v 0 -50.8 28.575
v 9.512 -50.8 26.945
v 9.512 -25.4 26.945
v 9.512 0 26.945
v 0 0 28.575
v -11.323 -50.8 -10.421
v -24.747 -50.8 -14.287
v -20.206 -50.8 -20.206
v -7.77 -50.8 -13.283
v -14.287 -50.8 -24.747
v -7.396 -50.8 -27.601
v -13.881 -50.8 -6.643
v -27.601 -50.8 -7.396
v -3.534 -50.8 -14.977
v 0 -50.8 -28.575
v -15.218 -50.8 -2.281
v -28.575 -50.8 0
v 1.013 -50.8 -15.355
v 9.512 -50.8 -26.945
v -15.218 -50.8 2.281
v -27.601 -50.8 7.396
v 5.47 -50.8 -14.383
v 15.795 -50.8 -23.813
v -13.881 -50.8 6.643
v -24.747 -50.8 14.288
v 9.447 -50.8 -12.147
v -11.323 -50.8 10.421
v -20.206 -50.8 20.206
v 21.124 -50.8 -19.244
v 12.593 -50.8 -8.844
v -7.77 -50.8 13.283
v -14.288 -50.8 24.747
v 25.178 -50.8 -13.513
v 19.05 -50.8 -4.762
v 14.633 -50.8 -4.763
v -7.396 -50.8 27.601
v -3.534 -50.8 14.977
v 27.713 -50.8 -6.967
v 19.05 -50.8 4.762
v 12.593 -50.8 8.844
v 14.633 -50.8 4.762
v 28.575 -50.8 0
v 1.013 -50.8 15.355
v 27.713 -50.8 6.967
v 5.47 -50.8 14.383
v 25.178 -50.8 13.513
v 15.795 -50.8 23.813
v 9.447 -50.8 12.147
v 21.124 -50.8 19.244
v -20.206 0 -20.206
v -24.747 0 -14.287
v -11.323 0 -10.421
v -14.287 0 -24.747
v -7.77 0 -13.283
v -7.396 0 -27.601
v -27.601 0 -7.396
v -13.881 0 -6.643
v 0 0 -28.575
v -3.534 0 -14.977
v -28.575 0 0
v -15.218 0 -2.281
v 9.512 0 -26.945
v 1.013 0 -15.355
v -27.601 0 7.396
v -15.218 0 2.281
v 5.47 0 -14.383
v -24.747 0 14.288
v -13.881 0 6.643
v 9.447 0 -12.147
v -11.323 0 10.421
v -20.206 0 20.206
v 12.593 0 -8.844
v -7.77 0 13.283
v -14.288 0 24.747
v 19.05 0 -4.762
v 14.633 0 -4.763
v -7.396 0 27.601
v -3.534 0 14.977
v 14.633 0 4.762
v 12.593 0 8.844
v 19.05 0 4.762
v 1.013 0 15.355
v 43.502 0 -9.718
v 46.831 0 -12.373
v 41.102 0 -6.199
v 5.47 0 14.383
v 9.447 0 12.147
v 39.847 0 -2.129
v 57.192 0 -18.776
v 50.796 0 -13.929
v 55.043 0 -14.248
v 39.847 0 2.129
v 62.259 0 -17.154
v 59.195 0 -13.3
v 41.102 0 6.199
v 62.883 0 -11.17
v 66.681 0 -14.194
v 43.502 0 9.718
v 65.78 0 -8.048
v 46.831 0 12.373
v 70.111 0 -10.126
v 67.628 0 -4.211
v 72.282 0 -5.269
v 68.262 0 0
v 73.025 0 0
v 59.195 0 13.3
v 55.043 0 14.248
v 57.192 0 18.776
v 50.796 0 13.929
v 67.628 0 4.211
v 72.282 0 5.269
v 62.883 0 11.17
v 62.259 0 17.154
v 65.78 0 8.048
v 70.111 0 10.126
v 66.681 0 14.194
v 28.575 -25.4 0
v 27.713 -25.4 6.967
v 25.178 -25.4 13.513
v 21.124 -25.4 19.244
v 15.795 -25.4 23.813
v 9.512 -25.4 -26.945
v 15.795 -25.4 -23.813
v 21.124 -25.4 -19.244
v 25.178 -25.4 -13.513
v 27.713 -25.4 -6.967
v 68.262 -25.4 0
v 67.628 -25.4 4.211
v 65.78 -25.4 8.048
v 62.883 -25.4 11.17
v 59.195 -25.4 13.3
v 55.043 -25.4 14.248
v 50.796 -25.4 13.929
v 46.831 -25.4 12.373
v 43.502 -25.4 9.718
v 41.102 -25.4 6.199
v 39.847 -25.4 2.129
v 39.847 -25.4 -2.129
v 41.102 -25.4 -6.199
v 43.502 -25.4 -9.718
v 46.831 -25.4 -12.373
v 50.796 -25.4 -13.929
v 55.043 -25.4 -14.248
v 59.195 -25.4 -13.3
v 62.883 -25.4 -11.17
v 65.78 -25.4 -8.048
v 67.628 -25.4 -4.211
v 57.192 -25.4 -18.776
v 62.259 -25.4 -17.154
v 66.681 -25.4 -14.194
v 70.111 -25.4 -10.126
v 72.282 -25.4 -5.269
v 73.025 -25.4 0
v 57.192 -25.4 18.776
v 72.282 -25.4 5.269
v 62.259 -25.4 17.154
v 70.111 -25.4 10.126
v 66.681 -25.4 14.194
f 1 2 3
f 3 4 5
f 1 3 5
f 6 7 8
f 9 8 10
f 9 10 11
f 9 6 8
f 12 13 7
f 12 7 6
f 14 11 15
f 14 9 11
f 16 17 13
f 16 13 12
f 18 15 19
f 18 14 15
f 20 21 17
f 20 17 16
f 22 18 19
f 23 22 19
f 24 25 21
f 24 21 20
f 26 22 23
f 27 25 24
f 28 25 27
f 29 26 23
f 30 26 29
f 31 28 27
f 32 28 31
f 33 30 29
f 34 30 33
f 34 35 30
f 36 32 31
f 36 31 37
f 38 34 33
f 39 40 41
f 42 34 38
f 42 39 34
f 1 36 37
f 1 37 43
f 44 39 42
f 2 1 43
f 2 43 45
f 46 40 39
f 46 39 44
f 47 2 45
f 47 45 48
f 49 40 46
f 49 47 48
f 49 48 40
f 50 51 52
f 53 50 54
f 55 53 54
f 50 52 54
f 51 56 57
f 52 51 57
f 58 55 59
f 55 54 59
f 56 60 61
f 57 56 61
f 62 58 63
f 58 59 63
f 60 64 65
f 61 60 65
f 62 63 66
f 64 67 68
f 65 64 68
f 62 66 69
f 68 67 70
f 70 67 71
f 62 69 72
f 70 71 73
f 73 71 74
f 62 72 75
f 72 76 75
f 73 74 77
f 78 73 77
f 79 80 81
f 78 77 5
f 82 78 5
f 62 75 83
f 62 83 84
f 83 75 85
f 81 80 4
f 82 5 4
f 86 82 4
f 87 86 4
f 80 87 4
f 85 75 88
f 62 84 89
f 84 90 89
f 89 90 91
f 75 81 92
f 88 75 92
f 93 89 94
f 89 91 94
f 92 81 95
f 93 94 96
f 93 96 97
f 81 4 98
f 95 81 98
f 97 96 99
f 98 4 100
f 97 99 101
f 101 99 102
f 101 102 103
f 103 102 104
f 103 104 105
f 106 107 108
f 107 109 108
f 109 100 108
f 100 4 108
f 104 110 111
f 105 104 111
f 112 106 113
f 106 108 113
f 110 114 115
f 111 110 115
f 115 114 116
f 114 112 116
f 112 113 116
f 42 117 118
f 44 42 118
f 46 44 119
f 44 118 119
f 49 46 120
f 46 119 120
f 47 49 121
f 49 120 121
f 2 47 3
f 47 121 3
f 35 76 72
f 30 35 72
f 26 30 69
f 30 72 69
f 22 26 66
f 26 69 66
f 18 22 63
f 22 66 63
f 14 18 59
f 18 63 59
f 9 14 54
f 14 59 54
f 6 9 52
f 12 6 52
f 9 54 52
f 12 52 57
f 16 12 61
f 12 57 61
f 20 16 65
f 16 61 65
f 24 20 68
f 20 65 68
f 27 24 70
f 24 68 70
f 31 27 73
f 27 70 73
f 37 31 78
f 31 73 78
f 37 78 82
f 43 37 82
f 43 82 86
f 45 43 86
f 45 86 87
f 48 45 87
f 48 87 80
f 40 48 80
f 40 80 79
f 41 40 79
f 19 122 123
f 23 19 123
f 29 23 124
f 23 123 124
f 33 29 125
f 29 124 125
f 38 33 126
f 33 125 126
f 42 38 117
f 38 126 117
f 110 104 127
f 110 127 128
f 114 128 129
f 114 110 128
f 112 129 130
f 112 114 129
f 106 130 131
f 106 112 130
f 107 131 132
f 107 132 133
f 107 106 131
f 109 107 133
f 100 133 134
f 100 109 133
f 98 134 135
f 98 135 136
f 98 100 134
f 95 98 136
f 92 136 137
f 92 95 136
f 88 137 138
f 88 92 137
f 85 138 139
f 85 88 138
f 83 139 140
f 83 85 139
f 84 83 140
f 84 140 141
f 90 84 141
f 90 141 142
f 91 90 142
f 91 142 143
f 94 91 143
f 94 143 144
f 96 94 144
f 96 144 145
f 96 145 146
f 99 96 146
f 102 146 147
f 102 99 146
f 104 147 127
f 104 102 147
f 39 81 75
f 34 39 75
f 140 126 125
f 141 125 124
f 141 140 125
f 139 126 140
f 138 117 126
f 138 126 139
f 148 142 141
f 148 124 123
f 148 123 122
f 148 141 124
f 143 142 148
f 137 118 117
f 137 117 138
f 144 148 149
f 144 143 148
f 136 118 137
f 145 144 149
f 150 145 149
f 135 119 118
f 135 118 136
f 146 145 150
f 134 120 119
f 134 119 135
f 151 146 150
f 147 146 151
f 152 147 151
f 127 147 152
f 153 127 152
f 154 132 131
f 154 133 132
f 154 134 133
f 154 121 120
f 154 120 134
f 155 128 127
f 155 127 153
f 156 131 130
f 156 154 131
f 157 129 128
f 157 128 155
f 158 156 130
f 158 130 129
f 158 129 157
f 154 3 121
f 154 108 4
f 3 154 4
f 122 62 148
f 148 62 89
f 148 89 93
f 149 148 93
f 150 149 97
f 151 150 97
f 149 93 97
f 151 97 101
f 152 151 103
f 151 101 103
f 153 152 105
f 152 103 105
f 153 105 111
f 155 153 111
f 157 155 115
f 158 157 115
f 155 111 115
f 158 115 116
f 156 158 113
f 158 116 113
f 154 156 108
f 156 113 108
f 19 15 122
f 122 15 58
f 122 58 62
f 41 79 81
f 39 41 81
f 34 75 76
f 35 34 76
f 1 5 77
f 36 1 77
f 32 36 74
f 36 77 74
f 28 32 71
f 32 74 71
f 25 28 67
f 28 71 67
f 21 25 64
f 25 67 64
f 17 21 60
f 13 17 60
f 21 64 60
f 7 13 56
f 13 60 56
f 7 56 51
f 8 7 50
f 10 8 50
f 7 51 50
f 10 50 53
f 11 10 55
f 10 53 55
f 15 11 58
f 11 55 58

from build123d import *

# Parameters (mm, degrees)
F0_R     = 14.2875
F1_DEPTH = 25.4
F2_DEPTH = 50.8


with BuildPart() as f1:
    # F0 (on Front) → F1 (new body)
    with BuildSketch(Plane.XZ):
        with BuildLine():
            Line((9.5121844836, 26.9452959039), (0, 28.575))
            ThreePointArc((0, 28.575), (-28.575, 0), (0, -28.575))
            Line((0, -28.575), (9.5121844836, -26.9452959039))
            ThreePointArc((9.5121844836, -26.9452959039), (23.3274655355, -16.5033322905), (28.575, 0))
            ThreePointArc((28.575, 0), (23.3274655355, 16.5033322905), (9.5121844836, 26.9452959039))
        make_face()
        with BuildLine():
            ThreePointArc((-14.6329037383, 4.7625), (0, 15.3884137605), (14.6329037383, 4.7625))
            Line((14.6329037383, 4.7625), (19.05, 4.7625))
            Line((19.05, 4.7625), (19.05, -4.7625))
            Line((19.05, -4.7625), (14.6329037383, -4.7625))
            ThreePointArc((14.6329037383, -4.7625), (0, -15.3884137605), (-14.6329037383, -4.7625))
            Line((-14.6329037383, -4.7625), (-19.05, -4.7625))
            Line((-19.05, -4.7625), (-19.05, 4.7625))
            Line((-19.05, 4.7625), (-14.6329037383, 4.7625))
        make_face(mode=Mode.SUBTRACT)
        with BuildLine():
            Line((57.1919272622, 18.7764181619), (9.5121844836, 26.9452959039))
            ThreePointArc((9.5121844836, 26.9452959039), (23.3274655355, 16.5033322905), (28.575, 0))
            ThreePointArc((28.575, 0), (23.3274655355, -16.5033322905), (9.5121844836, -26.9452959039))
            Line((9.5121844836, -26.9452959039), (57.1919272622, -18.7764181619))
            ThreePointArc((57.1919272622, -18.7764181619), (34.925, 0), (57.1919272622, 18.7764181619))
        make_face()
        with BuildLine():
            ThreePointArc((73.025, 0), (68.5383952831, 12.2804730295), (57.1919272622, 18.7764181619))
            ThreePointArc((57.1919272622, 18.7764181619), (34.925, 0), (57.1919272622, -18.7764181619))
            ThreePointArc((57.1919272622, -18.7764181619), (68.5383952831, -12.2804730295), (73.025, 0))
        make_face()
        with Locations((53.975, 0)):
            Circle(F0_R, mode=Mode.SUBTRACT)
        with BuildLine():
            ThreePointArc((-14.6329037383, -4.7625), (-15.3884137605, 0), (-14.6329037383, 4.7625))
            Line((-14.6329037383, 4.7625), (-19.05, 4.7625))
            Line((-19.05, 4.7625), (-19.05, -4.7625))
            Line((-19.05, -4.7625), (-14.6329037383, -4.7625))
        make_face()
    extrude(amount=F1_DEPTH)

    # F0 (on Front) → F2 (join)
    with BuildSketch(Plane.XZ):
        with BuildLine():
            Line((9.5121844836, 26.9452959039), (0, 28.575))
            ThreePointArc((0, 28.575), (-28.575, 0), (0, -28.575))
            Line((0, -28.575), (9.5121844836, -26.9452959039))
            ThreePointArc((9.5121844836, -26.9452959039), (23.3274655355, -16.5033322905), (28.575, 0))
            ThreePointArc((28.575, 0), (23.3274655355, 16.5033322905), (9.5121844836, 26.9452959039))
        make_face()
        with BuildLine():
            ThreePointArc((-14.6329037383, 4.7625), (0, 15.3884137605), (14.6329037383, 4.7625))
            Line((14.6329037383, 4.7625), (19.05, 4.7625))
            Line((19.05, 4.7625), (19.05, -4.7625))
            Line((19.05, -4.7625), (14.6329037383, -4.7625))
            ThreePointArc((14.6329037383, -4.7625), (0, -15.3884137605), (-14.6329037383, -4.7625))
            Line((-14.6329037383, -4.7625), (-19.05, -4.7625))
            Line((-19.05, -4.7625), (-19.05, 4.7625))
            Line((-19.05, 4.7625), (-14.6329037383, 4.7625))
        make_face(mode=Mode.SUBTRACT)
        with BuildLine():
            ThreePointArc((-14.6329037383, -4.7625), (-15.3884137605, 0), (-14.6329037383, 4.7625))
            Line((-14.6329037383, 4.7625), (-19.05, 4.7625))
            Line((-19.05, 4.7625), (-19.05, -4.7625))
            Line((-19.05, -4.7625), (-14.6329037383, -4.7625))
        make_face()
    extrude(amount=F2_DEPTH)


solid = f1.part
